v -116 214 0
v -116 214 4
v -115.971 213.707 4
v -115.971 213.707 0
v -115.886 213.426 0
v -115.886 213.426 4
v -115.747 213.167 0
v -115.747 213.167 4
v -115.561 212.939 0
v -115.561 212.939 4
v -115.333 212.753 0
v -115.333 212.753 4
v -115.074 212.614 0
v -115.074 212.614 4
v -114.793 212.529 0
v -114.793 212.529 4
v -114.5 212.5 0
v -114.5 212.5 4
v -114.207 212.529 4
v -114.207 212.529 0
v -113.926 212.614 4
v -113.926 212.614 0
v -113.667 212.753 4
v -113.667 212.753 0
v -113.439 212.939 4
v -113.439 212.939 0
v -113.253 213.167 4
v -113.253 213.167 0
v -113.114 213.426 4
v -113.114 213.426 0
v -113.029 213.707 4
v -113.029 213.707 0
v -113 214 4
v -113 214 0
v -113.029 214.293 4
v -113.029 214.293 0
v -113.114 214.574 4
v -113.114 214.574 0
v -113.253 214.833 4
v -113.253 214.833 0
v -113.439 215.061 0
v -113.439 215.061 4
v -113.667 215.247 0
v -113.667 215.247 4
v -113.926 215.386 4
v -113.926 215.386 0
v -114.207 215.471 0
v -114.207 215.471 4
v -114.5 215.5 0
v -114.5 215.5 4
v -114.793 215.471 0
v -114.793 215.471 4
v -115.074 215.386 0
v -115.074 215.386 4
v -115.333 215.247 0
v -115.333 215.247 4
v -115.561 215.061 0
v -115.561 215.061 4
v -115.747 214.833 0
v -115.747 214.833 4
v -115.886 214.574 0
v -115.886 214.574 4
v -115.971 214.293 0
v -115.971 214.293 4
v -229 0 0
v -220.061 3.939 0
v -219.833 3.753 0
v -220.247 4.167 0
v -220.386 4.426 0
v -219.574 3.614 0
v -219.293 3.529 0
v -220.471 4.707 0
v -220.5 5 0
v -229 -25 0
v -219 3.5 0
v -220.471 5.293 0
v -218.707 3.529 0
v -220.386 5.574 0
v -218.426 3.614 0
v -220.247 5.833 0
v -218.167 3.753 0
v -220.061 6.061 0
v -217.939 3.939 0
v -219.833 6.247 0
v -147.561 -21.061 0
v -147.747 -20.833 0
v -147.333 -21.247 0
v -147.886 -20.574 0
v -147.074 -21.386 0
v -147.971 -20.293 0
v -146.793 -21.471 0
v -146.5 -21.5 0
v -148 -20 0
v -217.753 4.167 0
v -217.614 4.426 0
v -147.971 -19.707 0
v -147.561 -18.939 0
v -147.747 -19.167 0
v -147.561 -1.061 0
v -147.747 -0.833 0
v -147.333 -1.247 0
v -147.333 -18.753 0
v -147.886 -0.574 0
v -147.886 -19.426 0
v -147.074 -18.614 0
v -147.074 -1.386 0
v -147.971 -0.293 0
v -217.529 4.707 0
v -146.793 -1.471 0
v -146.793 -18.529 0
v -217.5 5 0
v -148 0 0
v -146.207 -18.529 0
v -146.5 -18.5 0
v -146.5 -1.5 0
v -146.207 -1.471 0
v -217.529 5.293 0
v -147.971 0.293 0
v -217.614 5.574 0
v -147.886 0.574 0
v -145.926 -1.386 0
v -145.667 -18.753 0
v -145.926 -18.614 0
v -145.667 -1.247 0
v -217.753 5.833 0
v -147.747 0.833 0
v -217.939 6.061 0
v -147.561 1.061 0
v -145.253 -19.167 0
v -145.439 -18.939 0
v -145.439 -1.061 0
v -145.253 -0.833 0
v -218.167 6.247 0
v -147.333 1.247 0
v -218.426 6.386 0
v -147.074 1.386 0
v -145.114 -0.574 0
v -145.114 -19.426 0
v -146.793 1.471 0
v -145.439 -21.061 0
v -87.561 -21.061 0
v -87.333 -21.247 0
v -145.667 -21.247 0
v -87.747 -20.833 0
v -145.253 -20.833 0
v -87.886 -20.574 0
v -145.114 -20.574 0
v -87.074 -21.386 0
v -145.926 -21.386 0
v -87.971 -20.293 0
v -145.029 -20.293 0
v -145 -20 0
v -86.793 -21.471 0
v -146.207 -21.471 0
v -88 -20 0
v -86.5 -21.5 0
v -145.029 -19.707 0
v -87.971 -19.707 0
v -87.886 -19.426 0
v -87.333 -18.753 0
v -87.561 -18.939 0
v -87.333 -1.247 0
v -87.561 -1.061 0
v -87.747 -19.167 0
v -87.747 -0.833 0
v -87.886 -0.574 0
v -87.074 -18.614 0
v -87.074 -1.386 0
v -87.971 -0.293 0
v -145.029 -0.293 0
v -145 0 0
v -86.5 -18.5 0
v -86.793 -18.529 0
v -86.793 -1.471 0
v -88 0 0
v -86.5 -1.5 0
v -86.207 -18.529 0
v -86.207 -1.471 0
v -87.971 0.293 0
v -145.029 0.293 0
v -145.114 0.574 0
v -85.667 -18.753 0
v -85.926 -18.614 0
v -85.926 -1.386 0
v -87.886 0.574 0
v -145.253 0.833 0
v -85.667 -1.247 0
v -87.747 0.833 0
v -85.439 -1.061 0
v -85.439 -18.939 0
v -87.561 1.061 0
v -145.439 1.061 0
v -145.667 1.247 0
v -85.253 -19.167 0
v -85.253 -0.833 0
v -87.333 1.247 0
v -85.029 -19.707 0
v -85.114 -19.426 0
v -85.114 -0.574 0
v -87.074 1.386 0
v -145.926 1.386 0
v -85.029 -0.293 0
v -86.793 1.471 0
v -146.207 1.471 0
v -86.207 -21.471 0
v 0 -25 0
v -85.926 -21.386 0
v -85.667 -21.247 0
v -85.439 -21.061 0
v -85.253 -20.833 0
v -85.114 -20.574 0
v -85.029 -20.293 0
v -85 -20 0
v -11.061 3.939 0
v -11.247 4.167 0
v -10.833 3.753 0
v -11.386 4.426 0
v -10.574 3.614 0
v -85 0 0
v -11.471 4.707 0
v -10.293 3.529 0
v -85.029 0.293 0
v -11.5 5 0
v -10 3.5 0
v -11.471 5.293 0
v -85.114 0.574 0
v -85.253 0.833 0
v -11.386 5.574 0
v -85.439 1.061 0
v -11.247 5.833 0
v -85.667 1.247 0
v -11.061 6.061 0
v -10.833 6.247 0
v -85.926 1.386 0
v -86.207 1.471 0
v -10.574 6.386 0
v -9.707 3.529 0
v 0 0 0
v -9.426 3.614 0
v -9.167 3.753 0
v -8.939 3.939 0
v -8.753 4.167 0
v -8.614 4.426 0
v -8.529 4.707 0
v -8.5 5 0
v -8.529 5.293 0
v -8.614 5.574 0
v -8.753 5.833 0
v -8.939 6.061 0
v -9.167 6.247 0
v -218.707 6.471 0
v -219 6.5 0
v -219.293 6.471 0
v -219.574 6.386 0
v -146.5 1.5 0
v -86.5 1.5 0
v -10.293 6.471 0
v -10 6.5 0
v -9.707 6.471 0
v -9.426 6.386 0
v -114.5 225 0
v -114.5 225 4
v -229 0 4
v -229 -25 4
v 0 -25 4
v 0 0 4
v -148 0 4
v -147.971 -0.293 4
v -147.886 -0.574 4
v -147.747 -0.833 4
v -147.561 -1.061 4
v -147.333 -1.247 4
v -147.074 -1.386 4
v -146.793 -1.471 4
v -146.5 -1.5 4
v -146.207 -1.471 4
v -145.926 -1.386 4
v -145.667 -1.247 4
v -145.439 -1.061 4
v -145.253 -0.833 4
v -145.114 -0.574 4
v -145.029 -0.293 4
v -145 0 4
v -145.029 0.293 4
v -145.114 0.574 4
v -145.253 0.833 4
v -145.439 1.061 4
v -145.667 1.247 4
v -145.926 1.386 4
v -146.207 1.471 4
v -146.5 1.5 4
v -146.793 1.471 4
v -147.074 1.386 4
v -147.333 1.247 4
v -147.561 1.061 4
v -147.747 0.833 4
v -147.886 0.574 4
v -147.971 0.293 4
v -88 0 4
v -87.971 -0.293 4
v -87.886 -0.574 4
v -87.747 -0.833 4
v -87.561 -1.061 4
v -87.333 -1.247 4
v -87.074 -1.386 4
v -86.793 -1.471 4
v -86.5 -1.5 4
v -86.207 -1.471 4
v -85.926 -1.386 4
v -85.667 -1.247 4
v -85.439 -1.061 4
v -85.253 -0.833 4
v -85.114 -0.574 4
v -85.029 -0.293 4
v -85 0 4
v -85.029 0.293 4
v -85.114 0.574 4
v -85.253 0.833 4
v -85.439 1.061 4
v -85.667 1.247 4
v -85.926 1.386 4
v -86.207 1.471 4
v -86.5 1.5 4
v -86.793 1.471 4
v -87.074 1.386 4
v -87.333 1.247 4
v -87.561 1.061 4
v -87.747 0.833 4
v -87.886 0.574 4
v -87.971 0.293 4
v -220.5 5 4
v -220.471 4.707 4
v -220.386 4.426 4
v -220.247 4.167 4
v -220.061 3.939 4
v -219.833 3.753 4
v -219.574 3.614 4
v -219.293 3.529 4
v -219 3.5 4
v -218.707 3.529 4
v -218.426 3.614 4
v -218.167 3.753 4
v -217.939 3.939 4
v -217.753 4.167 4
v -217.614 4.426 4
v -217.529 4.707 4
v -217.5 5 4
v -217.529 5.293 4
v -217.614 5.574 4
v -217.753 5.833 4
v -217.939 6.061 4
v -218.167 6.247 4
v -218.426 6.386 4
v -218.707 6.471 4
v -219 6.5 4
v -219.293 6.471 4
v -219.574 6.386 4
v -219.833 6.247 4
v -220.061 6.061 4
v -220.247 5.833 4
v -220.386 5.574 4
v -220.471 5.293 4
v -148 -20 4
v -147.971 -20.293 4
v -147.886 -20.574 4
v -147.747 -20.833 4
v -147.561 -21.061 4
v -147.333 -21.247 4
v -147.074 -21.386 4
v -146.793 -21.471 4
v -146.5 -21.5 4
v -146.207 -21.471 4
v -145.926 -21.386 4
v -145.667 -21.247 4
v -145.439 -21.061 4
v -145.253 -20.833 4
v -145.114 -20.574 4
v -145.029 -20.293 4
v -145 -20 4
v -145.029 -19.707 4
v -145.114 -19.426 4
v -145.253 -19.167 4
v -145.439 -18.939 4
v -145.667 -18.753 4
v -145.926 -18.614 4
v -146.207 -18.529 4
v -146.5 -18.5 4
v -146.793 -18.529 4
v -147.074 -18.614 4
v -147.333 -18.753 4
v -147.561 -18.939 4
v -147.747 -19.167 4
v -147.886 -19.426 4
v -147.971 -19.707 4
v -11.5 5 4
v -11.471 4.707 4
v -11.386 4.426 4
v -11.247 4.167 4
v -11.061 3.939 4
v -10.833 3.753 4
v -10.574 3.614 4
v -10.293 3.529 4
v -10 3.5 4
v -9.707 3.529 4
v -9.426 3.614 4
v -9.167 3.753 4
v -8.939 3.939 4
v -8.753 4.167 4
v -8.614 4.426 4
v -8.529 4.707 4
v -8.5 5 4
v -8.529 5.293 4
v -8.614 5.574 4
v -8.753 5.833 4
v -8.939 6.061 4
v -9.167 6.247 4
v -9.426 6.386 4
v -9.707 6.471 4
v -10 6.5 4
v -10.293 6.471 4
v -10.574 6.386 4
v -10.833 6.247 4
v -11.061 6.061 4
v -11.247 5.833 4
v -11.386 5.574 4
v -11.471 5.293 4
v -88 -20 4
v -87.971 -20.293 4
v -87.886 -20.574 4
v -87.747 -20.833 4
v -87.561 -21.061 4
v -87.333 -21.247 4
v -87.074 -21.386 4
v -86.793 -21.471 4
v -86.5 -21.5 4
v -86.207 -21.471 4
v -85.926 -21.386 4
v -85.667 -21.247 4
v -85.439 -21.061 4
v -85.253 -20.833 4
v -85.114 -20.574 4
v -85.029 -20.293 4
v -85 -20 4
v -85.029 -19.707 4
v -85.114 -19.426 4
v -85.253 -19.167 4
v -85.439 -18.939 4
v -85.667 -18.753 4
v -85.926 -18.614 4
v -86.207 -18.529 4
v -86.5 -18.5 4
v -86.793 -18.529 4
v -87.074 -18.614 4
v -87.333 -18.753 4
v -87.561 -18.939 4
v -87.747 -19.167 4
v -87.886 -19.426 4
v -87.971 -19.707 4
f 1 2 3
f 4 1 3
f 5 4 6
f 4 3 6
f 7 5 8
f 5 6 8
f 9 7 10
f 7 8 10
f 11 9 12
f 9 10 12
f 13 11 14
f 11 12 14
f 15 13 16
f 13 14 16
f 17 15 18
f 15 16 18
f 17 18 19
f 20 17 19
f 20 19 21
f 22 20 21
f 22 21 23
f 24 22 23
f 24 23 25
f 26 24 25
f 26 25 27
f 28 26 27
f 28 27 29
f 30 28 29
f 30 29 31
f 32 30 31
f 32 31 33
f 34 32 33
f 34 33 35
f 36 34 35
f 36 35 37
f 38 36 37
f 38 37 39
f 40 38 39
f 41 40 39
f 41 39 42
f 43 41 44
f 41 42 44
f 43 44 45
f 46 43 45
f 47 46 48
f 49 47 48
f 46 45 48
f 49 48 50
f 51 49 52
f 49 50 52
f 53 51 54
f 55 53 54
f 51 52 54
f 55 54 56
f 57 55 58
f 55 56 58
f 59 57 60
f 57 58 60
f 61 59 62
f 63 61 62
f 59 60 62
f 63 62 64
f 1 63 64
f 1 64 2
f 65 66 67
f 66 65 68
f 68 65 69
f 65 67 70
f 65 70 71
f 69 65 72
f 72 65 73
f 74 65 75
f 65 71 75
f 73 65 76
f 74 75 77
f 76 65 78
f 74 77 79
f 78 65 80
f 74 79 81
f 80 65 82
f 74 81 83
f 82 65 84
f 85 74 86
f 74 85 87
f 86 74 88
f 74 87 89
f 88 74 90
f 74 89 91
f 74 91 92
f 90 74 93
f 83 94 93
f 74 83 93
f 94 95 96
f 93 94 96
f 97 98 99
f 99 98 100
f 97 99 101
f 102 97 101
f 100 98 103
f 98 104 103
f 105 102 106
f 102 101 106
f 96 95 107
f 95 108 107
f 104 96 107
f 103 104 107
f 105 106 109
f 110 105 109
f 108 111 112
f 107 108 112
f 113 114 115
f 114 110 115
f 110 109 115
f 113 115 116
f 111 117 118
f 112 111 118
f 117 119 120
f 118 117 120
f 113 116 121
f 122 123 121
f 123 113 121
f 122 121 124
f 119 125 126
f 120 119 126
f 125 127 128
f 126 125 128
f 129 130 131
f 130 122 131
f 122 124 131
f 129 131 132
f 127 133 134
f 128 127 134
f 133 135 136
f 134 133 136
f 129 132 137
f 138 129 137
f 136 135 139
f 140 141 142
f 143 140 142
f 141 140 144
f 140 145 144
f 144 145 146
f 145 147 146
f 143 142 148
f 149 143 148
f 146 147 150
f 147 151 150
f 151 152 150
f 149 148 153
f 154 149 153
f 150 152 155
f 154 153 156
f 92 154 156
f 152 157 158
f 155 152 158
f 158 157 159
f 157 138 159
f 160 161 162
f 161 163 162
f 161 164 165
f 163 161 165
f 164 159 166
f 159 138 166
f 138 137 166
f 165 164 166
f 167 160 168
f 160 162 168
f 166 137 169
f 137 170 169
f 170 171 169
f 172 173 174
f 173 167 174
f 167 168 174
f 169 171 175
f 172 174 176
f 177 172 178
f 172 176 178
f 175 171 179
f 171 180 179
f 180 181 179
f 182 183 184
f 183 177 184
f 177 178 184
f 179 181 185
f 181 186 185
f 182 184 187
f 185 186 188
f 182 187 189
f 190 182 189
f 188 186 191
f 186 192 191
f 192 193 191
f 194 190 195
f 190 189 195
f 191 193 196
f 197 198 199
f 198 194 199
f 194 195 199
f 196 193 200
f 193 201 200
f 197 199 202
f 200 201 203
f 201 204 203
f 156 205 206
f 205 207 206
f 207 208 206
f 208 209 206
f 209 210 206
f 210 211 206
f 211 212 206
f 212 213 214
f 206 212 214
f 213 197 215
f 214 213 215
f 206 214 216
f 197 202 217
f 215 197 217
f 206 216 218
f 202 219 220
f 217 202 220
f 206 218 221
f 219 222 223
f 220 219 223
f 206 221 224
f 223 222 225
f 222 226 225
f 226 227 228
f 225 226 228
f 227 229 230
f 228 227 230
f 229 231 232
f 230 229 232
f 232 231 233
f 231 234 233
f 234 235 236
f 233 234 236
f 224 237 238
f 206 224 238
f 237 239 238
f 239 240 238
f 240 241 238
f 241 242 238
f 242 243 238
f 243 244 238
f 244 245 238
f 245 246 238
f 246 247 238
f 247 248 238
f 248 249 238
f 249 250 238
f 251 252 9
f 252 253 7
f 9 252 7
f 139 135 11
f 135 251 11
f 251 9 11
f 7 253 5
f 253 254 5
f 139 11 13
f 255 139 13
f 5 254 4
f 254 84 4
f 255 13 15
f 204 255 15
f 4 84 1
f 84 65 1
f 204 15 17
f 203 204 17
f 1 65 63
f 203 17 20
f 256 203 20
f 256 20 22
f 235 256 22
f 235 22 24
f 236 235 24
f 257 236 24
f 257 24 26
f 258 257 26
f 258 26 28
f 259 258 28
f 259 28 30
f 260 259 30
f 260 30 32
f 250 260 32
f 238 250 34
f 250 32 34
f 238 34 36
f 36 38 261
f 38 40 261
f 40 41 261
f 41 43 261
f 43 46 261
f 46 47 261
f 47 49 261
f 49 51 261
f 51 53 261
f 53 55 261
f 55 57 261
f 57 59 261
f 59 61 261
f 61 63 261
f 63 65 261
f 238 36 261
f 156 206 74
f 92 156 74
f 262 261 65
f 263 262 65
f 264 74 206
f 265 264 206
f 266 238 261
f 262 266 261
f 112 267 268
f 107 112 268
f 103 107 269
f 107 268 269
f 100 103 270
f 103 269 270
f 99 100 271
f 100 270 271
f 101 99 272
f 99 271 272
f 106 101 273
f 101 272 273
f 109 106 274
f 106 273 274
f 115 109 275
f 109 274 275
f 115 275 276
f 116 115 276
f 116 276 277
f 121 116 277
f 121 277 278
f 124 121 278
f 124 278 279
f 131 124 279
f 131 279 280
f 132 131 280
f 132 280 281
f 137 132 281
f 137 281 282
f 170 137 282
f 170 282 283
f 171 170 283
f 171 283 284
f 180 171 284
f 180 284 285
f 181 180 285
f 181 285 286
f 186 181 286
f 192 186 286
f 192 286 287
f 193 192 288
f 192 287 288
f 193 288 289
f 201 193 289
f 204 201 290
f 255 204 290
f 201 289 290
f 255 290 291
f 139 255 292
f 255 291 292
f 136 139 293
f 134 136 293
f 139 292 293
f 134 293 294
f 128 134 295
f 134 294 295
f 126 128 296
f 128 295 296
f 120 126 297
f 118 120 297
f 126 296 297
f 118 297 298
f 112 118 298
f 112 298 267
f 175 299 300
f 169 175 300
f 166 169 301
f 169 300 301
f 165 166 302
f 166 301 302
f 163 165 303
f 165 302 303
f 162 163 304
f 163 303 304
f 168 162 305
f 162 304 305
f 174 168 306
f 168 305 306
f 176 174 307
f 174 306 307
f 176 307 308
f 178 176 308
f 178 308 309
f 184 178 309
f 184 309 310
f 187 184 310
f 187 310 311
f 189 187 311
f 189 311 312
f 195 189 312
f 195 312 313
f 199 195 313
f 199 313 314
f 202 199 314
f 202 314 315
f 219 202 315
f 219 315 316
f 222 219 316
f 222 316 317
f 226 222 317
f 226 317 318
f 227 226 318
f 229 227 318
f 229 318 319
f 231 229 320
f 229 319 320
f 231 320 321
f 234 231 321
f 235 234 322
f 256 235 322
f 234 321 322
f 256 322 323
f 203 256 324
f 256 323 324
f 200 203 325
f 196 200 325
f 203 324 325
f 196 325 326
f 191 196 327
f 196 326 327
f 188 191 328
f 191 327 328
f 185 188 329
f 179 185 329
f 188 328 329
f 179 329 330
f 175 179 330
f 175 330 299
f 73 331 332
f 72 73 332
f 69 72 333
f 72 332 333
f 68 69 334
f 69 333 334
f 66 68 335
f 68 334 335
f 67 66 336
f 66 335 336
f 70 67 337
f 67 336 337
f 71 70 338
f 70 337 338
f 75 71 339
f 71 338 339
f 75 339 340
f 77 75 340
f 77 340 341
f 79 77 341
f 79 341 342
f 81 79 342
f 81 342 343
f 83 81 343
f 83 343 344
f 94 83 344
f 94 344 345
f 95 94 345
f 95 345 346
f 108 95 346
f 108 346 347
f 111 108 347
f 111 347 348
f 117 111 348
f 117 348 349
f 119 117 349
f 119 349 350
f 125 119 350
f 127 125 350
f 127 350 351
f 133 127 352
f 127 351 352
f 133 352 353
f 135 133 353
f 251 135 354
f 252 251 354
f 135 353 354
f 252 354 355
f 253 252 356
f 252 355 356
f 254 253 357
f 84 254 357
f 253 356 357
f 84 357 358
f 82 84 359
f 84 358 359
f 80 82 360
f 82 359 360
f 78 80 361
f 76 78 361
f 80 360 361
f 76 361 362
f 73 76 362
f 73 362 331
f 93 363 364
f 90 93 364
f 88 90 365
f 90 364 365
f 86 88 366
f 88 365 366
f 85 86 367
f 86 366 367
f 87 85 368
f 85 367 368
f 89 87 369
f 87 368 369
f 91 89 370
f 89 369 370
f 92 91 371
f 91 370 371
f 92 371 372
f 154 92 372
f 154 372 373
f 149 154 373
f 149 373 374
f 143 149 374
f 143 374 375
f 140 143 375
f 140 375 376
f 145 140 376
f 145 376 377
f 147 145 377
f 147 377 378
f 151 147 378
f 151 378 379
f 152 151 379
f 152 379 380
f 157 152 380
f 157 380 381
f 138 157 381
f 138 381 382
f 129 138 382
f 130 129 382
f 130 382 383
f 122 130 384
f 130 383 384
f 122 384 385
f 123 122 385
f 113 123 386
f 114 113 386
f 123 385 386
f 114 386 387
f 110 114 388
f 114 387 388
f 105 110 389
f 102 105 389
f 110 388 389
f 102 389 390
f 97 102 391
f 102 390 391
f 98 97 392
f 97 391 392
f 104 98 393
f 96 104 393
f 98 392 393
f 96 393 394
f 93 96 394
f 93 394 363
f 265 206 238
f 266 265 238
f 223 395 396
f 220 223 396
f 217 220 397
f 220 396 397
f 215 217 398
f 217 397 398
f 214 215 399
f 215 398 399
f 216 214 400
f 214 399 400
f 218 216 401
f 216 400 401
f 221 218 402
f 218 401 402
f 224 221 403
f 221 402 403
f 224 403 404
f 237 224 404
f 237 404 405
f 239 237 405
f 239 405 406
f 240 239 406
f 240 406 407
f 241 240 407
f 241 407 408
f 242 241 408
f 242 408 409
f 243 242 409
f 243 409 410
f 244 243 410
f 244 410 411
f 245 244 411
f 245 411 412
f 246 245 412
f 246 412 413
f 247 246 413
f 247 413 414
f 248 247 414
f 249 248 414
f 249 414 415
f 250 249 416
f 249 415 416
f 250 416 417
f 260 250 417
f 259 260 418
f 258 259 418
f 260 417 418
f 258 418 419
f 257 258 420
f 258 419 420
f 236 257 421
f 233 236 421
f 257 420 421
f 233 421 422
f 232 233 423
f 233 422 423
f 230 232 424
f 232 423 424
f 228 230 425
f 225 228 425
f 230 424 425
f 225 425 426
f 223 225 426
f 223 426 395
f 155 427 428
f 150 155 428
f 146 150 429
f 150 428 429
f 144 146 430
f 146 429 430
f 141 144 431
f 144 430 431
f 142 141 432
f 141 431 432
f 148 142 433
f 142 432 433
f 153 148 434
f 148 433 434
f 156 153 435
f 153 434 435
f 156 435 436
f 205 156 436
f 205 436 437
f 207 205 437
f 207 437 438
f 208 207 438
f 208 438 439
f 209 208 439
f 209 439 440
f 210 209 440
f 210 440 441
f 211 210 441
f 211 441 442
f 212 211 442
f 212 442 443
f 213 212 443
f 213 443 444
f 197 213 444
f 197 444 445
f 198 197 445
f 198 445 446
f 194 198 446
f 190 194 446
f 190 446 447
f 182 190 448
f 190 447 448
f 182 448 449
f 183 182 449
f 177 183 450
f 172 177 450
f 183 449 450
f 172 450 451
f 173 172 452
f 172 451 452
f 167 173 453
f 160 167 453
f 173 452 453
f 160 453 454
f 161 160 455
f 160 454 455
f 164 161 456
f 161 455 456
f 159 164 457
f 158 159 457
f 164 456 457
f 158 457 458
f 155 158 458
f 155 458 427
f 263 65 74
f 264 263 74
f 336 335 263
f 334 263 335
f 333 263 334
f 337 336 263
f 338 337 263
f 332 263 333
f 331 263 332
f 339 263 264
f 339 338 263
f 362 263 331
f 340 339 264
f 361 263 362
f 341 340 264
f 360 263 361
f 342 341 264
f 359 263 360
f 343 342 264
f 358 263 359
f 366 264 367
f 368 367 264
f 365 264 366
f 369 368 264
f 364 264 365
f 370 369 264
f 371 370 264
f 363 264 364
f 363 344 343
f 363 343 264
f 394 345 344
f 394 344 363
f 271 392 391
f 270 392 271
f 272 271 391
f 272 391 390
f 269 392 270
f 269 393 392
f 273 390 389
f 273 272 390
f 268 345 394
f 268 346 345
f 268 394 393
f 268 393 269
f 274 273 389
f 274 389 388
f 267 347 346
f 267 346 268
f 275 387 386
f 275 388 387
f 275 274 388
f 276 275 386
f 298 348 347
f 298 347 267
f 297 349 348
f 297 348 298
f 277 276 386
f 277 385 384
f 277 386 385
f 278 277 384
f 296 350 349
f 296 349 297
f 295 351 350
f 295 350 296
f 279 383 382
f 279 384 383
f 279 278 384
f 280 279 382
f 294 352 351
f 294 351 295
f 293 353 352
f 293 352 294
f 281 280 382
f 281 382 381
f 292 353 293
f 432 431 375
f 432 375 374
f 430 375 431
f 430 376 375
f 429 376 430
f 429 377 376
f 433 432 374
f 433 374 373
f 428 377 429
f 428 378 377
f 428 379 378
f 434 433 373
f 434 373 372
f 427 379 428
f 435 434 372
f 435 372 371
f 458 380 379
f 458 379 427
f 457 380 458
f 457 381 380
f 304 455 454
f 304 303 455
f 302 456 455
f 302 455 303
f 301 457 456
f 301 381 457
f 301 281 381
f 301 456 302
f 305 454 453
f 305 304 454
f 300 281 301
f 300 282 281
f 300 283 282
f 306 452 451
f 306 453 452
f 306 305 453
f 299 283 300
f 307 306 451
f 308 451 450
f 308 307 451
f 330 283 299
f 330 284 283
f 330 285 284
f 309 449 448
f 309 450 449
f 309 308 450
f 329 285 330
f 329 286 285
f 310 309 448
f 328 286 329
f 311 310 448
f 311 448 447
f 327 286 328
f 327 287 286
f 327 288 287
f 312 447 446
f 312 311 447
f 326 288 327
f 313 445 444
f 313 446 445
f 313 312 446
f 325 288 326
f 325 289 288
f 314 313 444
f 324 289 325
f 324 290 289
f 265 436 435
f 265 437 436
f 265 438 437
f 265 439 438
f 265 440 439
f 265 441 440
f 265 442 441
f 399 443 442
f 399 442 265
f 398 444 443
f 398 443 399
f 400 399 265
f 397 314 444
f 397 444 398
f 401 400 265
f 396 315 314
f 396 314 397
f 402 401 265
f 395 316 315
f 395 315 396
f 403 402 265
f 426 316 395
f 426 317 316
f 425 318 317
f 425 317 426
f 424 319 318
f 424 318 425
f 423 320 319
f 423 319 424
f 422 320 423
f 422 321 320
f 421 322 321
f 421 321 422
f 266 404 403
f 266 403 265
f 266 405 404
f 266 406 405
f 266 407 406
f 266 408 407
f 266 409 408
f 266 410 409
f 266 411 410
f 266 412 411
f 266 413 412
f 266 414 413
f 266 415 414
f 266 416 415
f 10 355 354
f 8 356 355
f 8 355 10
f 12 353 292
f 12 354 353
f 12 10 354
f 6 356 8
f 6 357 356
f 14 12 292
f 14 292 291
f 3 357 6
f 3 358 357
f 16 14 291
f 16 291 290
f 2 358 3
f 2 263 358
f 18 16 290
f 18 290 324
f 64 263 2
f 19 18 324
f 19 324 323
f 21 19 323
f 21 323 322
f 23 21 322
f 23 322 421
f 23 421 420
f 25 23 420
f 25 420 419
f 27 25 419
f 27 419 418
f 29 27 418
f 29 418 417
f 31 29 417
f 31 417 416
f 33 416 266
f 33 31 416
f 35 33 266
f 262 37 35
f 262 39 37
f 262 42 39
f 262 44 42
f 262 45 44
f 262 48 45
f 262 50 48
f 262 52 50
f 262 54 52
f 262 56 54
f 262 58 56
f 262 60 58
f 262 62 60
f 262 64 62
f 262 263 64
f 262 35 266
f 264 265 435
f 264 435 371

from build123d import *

# Parameters (mm, degrees)
F1_DEPTH = 4
F2_D     = 3


with BuildPart() as f1:
    # F0 (on Top) → F1 (new body)
    with BuildSketch(Plane.XY):
        Polygon((0, 0), (-114.5, 225), (-229, 0), (-229, -25), (0, -25), align=None)
    extrude(amount=F1_DEPTH)

    # F2 (through all)
    with Locations(Plane(origin=(0, 0, 0), x_dir=(1, 0, 0), z_dir=(0, 0, -1))):
        with Locations((-114.5, -214), (-219, -5), (-146.5, 0), (-146.5, 20), (-86.5, 20), (-86.5, 0), (-10, -5)):
            Hole(F2_D / 2)


solid = f1.part
